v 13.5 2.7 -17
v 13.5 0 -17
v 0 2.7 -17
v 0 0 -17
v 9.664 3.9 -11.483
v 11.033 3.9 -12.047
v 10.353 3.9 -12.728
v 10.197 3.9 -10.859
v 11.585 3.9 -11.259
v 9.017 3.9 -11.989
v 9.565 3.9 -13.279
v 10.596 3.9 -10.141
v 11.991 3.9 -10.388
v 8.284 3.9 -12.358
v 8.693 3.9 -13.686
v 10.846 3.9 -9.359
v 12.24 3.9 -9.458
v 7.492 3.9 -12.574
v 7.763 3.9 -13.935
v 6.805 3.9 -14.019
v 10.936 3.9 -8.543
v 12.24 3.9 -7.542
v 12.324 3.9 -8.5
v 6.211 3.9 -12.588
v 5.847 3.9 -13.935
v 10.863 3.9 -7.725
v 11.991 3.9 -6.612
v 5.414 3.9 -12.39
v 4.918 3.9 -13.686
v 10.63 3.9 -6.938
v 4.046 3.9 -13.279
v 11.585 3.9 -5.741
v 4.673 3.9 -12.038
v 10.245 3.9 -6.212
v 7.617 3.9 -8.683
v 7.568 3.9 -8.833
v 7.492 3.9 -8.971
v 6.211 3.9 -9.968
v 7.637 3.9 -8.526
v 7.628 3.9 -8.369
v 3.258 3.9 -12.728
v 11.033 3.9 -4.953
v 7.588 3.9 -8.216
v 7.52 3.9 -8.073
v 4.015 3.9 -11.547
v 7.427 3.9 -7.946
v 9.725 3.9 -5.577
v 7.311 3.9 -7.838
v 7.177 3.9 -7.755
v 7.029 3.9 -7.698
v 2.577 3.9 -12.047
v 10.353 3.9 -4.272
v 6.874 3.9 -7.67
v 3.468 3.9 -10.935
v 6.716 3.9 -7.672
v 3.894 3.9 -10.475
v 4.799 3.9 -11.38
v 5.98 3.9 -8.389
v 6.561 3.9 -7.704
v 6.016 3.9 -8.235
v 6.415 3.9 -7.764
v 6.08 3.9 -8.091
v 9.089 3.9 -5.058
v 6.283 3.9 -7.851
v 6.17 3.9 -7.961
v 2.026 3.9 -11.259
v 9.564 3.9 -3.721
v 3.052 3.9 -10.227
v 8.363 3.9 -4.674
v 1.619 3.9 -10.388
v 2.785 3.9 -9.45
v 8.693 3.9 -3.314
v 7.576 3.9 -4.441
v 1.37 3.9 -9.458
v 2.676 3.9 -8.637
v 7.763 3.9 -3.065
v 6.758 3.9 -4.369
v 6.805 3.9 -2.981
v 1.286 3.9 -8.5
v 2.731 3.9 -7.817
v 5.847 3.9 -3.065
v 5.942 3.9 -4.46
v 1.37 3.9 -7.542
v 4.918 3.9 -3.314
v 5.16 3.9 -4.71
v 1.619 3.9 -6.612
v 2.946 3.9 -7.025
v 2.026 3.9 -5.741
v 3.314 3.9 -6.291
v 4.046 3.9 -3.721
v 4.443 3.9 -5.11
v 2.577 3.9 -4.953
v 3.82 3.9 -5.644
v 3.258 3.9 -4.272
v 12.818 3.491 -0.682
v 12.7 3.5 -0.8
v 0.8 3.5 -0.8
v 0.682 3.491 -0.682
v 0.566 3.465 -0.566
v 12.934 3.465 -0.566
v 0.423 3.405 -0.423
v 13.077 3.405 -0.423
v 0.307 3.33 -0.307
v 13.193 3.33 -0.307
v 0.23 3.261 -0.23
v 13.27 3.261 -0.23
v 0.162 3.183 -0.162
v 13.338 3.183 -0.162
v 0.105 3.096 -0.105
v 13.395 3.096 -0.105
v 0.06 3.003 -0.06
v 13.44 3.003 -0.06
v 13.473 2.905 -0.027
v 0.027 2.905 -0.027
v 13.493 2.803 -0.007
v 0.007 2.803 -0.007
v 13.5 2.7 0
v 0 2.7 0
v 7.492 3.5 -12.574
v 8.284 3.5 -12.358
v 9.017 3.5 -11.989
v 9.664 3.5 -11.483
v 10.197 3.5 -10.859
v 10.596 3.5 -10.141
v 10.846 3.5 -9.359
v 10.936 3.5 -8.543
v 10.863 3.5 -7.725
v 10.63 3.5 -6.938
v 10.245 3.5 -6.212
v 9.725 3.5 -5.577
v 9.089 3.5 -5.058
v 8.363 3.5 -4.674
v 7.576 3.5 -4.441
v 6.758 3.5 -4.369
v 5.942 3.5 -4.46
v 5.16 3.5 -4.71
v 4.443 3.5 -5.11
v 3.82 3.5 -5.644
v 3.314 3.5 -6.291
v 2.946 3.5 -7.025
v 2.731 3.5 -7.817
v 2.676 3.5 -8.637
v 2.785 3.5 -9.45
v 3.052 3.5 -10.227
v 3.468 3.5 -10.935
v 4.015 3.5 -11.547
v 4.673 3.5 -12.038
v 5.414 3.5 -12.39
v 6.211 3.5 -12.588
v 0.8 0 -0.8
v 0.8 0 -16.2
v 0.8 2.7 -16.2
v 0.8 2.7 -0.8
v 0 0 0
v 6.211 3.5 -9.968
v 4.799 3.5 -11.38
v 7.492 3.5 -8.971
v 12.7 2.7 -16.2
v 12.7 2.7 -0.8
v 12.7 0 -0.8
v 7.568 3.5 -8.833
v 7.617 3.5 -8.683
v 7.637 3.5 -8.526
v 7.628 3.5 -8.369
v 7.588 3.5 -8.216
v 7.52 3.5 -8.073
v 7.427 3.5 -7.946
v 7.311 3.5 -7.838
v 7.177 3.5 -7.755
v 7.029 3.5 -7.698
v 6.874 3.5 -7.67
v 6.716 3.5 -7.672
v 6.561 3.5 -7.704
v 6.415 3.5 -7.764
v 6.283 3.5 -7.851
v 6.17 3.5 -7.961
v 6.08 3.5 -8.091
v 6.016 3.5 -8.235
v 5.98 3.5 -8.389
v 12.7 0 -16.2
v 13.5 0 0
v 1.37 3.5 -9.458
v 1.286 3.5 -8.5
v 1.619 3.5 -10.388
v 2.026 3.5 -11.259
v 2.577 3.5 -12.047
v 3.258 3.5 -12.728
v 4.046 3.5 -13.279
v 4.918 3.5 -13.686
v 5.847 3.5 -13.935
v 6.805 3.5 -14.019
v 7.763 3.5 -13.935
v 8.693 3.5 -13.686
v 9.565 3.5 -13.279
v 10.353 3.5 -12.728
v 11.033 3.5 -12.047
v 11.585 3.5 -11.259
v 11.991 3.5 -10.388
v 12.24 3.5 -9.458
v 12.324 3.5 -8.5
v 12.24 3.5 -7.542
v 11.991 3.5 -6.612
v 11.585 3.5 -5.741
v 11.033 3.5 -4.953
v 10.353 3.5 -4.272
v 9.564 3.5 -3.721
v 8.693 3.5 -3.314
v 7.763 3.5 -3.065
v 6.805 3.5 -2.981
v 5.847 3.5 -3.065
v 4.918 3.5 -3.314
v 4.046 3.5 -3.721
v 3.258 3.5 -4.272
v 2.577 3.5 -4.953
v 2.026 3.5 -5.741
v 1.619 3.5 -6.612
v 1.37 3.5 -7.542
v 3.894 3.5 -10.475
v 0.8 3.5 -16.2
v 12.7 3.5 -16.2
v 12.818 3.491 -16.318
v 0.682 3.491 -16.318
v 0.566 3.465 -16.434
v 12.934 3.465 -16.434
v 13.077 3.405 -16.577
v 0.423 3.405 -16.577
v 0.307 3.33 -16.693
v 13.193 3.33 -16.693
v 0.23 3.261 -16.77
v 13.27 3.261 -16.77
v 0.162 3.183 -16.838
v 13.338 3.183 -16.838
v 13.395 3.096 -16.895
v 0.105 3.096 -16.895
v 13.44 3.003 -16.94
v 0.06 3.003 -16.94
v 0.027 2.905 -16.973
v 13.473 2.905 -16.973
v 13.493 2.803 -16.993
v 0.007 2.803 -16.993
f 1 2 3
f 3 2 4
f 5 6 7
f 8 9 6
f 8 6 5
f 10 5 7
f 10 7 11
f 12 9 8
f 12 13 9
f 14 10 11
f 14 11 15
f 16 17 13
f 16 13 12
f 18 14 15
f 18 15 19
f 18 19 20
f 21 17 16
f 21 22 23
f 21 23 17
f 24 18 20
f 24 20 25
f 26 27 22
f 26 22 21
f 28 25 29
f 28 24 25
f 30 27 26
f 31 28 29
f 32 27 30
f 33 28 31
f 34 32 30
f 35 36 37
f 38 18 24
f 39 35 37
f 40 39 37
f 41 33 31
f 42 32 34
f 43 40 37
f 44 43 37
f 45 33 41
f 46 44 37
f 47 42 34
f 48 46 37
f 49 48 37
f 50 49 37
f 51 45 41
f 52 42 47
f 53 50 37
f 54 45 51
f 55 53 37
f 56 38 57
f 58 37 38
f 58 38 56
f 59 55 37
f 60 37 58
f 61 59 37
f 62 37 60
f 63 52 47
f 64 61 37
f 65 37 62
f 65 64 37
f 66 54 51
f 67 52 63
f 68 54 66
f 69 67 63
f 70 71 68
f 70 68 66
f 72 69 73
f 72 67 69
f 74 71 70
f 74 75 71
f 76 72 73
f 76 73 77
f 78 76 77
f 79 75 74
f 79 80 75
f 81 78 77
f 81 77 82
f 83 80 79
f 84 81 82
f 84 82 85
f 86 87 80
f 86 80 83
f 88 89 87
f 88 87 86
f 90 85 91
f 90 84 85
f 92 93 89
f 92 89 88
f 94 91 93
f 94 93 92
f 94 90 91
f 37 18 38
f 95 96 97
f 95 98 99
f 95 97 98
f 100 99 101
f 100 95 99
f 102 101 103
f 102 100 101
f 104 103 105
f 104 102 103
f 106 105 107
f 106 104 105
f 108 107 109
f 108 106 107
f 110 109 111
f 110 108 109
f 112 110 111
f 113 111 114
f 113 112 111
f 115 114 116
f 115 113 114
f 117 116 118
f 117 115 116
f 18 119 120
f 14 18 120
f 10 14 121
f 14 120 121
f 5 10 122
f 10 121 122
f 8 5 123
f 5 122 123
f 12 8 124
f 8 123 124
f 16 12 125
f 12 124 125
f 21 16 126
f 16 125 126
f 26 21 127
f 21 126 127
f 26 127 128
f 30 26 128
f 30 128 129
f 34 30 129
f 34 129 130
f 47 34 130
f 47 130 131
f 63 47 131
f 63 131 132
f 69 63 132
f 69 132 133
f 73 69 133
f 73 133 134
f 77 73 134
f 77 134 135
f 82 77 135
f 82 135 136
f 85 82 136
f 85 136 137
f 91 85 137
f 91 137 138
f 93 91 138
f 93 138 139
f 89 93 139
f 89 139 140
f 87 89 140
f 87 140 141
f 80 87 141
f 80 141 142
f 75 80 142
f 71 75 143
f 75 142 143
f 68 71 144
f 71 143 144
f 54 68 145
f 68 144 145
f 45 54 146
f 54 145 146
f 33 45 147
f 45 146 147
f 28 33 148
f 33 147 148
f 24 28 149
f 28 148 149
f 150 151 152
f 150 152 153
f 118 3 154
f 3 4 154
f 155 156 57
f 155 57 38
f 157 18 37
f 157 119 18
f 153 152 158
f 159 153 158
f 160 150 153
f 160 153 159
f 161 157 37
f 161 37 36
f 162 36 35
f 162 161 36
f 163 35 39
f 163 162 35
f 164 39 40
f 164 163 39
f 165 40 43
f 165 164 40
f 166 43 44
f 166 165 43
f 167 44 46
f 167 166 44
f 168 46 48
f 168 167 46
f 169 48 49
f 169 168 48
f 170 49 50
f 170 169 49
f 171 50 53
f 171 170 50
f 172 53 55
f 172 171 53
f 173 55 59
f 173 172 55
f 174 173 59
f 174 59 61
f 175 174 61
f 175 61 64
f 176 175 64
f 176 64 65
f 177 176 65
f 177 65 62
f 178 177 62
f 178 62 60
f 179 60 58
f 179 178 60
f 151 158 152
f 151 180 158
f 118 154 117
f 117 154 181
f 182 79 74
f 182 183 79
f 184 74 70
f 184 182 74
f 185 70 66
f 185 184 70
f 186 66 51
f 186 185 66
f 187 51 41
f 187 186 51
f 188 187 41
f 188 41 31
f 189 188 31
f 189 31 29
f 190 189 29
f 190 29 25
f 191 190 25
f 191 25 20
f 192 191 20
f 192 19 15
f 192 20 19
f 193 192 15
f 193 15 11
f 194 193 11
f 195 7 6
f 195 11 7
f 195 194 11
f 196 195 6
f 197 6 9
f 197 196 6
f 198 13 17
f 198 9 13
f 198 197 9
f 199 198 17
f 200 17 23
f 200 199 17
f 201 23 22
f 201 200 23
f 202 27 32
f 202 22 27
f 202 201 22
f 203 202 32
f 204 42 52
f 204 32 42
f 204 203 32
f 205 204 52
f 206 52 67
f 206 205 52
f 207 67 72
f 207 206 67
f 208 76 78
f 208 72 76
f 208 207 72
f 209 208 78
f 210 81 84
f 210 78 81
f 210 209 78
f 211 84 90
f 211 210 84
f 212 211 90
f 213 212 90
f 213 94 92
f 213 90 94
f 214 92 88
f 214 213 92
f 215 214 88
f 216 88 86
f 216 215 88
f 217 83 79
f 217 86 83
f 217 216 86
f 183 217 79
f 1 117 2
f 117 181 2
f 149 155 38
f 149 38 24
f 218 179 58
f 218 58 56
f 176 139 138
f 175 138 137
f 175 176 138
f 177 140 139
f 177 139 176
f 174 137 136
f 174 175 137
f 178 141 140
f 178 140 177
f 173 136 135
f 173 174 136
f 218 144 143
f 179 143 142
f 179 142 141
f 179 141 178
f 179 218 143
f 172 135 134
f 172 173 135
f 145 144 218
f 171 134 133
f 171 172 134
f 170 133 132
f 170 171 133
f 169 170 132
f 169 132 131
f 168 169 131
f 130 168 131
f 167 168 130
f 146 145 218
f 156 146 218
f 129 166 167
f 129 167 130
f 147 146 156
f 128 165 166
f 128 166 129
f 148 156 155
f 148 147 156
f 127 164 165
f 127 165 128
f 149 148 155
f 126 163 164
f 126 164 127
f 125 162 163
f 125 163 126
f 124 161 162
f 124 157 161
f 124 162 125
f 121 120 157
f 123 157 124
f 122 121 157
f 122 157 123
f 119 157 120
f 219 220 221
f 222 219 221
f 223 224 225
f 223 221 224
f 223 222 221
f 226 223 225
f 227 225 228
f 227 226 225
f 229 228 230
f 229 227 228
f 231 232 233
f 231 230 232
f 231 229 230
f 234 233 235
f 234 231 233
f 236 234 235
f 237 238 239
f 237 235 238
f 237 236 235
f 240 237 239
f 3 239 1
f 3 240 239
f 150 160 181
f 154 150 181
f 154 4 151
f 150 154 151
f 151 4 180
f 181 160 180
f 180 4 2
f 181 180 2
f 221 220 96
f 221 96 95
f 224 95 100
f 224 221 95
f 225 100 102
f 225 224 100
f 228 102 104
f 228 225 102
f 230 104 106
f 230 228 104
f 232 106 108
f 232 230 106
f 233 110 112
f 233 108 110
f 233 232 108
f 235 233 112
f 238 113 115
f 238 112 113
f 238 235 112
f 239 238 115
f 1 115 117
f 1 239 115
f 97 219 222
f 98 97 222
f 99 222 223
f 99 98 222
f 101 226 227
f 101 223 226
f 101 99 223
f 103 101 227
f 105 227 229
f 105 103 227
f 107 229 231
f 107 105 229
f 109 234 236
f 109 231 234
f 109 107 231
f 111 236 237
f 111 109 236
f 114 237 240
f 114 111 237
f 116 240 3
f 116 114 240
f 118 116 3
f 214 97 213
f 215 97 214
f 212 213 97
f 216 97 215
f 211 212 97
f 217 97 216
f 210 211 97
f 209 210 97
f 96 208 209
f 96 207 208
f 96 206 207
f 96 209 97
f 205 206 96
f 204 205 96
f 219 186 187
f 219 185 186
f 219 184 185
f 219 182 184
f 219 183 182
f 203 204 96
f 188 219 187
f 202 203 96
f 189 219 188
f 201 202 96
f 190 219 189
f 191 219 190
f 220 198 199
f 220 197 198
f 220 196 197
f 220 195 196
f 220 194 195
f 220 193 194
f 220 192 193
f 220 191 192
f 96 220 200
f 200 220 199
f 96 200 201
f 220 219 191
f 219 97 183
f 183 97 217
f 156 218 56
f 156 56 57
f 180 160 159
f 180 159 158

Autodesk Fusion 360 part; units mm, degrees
sketch "Sketch1" plane through (0, 0, 0) normal (0, 1, 0) x (1, 0, 0)
  line L0 (0, 0) -> (13.5, 0)
  line L1 (13.5, 0) -> (13.5, 17)
  line L2 (13.5, 17) -> (0, 17)
  line L3 (0, 17) -> (0, 0)
  dimension "d1" = 17
  dimension "d2" = 13.5
extrude "Extrude1" add sketch "Sketch1" along normal blind 3.5
shell "Shell1" thickness 0.8 removed faces 1 at (4.5, 0, -11.3333)
fillet "Fillet1" radius 0.8 4 edges at (6.75, 3.5, 0) (0, 3.5, -8.5) (6.75, 3.5, -17) (13.5, 3.5, -8.5)
sketch "Sketch2" plane through (0, 3.5, 0) normal (0, 1, 0) x (-1, 0, 0)
  line L0 (-12.7, -16.2) -> (-0.8, -16.2)
  line L1 (-0.8, -16.2) -> (-0.8, -0.8)
  line L2 (-0.8, -0.8) -> (-12.7, -0.8)
  line L3 (-12.7, -0.8) -> (-12.7, -16.2)
  circle A0 centre (-6.8051, -8.5) radius 5.5188
  circle A1 centre (-6.8051, -8.5) radius 4.1313
  line L4 (-6.2112, -12.8845) -> (-7.4916, -12.8845)
  line L5 (-7.4916, -12.8845) -> (-7.4916, -8.2604)
  line L6 (-7.4916, -8.2604) -> (-6.2112, -8.2604)
  line L7 (-6.2112, -8.2604) -> (-6.2112, -12.8845)
  line L8 (-4.7993, -11.3803) -> (-7.4152, -8.7643)
  line L9 (-7.4152, -8.7643) -> (-6.5099, -7.8589)
  line L10 (-6.5099, -7.8589) -> (-3.8939, -10.4749)
  line L11 (-3.8939, -10.4749) -> (-4.7993, -11.3803)
  circle A2 centre (-6.8051, -8.5) radius 0.8328
extrude "Extrude4" add sketch "Sketch2" along normal blind 0.4 contours A0 | A1 L5 L7 L8 A2 | A1 L4 L5 L7 | L5 L6 L9 L10 A2 | L5 L6 L8 L9 A2 | L7 L8 A2 | L7 L8 L10 L11 A2 | L6 L7 L9 L10 A2 | L6 L7 L8 L9 A2
